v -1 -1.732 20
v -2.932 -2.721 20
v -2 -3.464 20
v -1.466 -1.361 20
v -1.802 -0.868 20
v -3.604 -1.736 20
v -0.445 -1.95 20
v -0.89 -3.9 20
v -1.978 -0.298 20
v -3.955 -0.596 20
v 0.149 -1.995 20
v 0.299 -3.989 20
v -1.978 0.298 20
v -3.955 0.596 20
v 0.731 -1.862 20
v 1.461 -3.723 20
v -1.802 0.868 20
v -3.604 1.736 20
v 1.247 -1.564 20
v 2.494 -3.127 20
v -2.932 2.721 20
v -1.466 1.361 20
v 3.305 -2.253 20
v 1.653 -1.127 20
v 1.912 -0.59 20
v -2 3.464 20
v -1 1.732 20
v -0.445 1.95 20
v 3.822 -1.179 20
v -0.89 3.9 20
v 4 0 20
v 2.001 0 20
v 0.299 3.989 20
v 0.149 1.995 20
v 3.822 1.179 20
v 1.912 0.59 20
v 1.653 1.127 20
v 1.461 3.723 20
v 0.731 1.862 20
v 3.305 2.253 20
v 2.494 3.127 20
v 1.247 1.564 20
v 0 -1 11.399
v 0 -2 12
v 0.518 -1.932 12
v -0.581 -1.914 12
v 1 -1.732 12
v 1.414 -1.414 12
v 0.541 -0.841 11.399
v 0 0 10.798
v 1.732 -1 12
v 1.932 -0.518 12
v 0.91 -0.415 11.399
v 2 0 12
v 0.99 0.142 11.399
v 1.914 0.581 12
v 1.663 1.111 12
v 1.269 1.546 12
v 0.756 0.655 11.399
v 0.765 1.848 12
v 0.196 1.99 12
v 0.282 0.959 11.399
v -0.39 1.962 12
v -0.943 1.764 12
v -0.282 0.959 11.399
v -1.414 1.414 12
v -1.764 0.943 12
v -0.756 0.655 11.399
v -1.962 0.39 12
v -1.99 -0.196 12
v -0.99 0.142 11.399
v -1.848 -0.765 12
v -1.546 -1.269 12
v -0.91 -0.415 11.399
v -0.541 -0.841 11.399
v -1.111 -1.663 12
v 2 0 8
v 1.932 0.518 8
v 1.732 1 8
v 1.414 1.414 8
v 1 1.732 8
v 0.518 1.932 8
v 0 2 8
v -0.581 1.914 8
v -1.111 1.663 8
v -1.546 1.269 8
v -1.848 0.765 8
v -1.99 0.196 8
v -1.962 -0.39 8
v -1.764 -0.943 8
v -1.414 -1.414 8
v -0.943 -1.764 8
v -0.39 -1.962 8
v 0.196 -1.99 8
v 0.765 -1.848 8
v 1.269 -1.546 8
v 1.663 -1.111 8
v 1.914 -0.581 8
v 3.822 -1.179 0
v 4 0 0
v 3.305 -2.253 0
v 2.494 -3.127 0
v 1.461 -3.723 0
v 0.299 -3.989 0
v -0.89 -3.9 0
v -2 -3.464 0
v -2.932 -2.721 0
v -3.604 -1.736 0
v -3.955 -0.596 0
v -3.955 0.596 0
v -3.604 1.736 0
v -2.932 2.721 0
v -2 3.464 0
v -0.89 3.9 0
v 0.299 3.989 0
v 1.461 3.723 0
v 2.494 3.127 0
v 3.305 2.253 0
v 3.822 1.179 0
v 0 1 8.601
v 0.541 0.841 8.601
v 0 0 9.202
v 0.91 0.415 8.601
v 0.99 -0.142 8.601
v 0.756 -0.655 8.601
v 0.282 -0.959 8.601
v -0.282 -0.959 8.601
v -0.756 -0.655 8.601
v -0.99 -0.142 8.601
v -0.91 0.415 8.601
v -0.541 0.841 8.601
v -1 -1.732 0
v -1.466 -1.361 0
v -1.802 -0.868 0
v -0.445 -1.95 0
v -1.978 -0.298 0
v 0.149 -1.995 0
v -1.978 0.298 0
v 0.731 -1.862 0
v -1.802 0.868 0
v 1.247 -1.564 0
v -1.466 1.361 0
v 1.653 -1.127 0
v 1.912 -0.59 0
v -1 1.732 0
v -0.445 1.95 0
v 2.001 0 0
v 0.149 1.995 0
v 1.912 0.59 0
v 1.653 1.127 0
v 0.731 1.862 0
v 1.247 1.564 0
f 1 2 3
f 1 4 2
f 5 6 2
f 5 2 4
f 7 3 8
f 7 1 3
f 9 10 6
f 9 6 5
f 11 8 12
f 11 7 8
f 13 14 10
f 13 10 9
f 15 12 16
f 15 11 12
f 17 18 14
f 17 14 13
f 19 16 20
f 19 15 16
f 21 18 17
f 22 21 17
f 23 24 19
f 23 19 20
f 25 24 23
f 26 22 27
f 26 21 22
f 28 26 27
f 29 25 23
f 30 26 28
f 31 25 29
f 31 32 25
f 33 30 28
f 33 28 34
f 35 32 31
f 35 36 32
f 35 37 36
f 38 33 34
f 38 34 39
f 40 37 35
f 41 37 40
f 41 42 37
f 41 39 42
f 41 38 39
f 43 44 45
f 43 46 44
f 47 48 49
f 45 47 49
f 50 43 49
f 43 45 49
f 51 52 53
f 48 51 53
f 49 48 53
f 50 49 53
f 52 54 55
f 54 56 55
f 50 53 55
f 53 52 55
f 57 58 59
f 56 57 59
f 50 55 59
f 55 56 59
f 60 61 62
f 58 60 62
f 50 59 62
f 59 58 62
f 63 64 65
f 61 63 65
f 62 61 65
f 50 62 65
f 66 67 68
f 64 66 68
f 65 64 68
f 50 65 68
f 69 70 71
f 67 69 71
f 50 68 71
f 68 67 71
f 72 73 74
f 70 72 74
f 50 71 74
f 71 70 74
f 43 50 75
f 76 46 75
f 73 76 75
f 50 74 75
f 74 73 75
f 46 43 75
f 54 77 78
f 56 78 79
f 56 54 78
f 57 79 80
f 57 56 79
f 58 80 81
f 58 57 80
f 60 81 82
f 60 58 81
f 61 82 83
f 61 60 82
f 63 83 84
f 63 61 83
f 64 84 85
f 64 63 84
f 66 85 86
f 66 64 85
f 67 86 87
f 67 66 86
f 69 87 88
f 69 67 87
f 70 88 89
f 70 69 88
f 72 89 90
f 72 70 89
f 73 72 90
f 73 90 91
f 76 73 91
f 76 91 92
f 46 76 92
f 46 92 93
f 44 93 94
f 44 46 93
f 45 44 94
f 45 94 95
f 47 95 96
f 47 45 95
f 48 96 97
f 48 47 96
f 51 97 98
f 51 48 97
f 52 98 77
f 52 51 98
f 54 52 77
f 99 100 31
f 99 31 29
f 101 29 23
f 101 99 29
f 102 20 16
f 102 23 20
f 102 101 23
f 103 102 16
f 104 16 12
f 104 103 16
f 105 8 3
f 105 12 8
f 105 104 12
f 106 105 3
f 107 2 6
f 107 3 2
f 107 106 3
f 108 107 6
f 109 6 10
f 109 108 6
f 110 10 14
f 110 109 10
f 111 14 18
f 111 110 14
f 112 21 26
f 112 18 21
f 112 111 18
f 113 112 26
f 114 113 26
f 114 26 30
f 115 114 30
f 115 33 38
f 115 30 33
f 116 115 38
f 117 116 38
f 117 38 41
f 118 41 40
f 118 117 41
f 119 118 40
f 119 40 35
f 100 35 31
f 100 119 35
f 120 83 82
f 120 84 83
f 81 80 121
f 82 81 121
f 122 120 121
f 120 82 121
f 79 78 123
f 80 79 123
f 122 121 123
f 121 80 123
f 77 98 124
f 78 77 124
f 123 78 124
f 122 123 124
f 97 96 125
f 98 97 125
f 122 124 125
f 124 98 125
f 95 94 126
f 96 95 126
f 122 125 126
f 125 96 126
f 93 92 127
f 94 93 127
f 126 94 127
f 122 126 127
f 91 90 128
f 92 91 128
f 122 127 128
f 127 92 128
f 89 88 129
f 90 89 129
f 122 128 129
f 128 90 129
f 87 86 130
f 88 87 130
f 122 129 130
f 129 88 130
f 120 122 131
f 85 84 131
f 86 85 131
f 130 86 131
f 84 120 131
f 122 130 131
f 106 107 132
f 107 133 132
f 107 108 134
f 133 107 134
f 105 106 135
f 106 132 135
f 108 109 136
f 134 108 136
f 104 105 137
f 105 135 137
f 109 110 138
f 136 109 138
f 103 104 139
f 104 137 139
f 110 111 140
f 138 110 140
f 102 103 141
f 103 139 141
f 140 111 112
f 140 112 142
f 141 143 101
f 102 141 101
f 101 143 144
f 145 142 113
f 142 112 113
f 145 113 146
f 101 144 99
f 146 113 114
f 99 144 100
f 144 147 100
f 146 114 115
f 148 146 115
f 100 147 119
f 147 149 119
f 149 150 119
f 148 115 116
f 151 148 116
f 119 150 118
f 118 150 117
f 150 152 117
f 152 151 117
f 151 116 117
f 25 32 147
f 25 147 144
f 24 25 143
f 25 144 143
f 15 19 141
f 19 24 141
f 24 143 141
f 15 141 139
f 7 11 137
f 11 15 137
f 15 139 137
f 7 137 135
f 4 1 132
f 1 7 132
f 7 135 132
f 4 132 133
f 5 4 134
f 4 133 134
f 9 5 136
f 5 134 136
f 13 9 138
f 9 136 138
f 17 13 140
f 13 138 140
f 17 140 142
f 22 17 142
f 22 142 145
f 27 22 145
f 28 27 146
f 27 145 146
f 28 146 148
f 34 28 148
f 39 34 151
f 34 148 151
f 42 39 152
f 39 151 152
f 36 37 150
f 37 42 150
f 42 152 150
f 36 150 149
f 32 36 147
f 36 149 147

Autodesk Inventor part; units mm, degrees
ref_plane "YZ Plane" through (0, 0, 0) normal (1, 0, 0) x (0, 1, 0)
ref_plane "XZ Plane" through (0, 0, 0) normal (0, 1, 0) x (-1, 0, 0)
ref_plane "XY Plane" through (0, 0, 0) normal (0, 0, 1) x (1, 0, 0)
sketch "スケッチ1" plane through (0, 0, 0) normal (0, 0, 1) x (1, 0, 0)
  circle A0 centre (0, 0) radius 4
  circle A1 centre (0, 0) radius 2.0005
  dimension "d0" = 8
  dimension "d1" = 4.001
extrude "押し出し1" add sketch "スケッチ1" along normal blind 20
sketch "スケッチ2" plane through (0, 0, 20) normal (0, 0, 1) x (1, 0, 0)
  circle A0 centre (0, 0) radius 2
  dimension "d4" = 4
extrude "押し出し2" add sketch "スケッチ2" against normal blind 20
hole "穴1" at (0, 0, 20) direction (0, 0, -1) diameter 4 depth 8 tip angle 118
hole "穴2" at (0, 0, 0) direction (0, 0, 1) diameter 4 depth 8 tip angle 118
properties part number "スペーサーm4-20　簡易筒型" material "アルミニウム 2014-T4"
